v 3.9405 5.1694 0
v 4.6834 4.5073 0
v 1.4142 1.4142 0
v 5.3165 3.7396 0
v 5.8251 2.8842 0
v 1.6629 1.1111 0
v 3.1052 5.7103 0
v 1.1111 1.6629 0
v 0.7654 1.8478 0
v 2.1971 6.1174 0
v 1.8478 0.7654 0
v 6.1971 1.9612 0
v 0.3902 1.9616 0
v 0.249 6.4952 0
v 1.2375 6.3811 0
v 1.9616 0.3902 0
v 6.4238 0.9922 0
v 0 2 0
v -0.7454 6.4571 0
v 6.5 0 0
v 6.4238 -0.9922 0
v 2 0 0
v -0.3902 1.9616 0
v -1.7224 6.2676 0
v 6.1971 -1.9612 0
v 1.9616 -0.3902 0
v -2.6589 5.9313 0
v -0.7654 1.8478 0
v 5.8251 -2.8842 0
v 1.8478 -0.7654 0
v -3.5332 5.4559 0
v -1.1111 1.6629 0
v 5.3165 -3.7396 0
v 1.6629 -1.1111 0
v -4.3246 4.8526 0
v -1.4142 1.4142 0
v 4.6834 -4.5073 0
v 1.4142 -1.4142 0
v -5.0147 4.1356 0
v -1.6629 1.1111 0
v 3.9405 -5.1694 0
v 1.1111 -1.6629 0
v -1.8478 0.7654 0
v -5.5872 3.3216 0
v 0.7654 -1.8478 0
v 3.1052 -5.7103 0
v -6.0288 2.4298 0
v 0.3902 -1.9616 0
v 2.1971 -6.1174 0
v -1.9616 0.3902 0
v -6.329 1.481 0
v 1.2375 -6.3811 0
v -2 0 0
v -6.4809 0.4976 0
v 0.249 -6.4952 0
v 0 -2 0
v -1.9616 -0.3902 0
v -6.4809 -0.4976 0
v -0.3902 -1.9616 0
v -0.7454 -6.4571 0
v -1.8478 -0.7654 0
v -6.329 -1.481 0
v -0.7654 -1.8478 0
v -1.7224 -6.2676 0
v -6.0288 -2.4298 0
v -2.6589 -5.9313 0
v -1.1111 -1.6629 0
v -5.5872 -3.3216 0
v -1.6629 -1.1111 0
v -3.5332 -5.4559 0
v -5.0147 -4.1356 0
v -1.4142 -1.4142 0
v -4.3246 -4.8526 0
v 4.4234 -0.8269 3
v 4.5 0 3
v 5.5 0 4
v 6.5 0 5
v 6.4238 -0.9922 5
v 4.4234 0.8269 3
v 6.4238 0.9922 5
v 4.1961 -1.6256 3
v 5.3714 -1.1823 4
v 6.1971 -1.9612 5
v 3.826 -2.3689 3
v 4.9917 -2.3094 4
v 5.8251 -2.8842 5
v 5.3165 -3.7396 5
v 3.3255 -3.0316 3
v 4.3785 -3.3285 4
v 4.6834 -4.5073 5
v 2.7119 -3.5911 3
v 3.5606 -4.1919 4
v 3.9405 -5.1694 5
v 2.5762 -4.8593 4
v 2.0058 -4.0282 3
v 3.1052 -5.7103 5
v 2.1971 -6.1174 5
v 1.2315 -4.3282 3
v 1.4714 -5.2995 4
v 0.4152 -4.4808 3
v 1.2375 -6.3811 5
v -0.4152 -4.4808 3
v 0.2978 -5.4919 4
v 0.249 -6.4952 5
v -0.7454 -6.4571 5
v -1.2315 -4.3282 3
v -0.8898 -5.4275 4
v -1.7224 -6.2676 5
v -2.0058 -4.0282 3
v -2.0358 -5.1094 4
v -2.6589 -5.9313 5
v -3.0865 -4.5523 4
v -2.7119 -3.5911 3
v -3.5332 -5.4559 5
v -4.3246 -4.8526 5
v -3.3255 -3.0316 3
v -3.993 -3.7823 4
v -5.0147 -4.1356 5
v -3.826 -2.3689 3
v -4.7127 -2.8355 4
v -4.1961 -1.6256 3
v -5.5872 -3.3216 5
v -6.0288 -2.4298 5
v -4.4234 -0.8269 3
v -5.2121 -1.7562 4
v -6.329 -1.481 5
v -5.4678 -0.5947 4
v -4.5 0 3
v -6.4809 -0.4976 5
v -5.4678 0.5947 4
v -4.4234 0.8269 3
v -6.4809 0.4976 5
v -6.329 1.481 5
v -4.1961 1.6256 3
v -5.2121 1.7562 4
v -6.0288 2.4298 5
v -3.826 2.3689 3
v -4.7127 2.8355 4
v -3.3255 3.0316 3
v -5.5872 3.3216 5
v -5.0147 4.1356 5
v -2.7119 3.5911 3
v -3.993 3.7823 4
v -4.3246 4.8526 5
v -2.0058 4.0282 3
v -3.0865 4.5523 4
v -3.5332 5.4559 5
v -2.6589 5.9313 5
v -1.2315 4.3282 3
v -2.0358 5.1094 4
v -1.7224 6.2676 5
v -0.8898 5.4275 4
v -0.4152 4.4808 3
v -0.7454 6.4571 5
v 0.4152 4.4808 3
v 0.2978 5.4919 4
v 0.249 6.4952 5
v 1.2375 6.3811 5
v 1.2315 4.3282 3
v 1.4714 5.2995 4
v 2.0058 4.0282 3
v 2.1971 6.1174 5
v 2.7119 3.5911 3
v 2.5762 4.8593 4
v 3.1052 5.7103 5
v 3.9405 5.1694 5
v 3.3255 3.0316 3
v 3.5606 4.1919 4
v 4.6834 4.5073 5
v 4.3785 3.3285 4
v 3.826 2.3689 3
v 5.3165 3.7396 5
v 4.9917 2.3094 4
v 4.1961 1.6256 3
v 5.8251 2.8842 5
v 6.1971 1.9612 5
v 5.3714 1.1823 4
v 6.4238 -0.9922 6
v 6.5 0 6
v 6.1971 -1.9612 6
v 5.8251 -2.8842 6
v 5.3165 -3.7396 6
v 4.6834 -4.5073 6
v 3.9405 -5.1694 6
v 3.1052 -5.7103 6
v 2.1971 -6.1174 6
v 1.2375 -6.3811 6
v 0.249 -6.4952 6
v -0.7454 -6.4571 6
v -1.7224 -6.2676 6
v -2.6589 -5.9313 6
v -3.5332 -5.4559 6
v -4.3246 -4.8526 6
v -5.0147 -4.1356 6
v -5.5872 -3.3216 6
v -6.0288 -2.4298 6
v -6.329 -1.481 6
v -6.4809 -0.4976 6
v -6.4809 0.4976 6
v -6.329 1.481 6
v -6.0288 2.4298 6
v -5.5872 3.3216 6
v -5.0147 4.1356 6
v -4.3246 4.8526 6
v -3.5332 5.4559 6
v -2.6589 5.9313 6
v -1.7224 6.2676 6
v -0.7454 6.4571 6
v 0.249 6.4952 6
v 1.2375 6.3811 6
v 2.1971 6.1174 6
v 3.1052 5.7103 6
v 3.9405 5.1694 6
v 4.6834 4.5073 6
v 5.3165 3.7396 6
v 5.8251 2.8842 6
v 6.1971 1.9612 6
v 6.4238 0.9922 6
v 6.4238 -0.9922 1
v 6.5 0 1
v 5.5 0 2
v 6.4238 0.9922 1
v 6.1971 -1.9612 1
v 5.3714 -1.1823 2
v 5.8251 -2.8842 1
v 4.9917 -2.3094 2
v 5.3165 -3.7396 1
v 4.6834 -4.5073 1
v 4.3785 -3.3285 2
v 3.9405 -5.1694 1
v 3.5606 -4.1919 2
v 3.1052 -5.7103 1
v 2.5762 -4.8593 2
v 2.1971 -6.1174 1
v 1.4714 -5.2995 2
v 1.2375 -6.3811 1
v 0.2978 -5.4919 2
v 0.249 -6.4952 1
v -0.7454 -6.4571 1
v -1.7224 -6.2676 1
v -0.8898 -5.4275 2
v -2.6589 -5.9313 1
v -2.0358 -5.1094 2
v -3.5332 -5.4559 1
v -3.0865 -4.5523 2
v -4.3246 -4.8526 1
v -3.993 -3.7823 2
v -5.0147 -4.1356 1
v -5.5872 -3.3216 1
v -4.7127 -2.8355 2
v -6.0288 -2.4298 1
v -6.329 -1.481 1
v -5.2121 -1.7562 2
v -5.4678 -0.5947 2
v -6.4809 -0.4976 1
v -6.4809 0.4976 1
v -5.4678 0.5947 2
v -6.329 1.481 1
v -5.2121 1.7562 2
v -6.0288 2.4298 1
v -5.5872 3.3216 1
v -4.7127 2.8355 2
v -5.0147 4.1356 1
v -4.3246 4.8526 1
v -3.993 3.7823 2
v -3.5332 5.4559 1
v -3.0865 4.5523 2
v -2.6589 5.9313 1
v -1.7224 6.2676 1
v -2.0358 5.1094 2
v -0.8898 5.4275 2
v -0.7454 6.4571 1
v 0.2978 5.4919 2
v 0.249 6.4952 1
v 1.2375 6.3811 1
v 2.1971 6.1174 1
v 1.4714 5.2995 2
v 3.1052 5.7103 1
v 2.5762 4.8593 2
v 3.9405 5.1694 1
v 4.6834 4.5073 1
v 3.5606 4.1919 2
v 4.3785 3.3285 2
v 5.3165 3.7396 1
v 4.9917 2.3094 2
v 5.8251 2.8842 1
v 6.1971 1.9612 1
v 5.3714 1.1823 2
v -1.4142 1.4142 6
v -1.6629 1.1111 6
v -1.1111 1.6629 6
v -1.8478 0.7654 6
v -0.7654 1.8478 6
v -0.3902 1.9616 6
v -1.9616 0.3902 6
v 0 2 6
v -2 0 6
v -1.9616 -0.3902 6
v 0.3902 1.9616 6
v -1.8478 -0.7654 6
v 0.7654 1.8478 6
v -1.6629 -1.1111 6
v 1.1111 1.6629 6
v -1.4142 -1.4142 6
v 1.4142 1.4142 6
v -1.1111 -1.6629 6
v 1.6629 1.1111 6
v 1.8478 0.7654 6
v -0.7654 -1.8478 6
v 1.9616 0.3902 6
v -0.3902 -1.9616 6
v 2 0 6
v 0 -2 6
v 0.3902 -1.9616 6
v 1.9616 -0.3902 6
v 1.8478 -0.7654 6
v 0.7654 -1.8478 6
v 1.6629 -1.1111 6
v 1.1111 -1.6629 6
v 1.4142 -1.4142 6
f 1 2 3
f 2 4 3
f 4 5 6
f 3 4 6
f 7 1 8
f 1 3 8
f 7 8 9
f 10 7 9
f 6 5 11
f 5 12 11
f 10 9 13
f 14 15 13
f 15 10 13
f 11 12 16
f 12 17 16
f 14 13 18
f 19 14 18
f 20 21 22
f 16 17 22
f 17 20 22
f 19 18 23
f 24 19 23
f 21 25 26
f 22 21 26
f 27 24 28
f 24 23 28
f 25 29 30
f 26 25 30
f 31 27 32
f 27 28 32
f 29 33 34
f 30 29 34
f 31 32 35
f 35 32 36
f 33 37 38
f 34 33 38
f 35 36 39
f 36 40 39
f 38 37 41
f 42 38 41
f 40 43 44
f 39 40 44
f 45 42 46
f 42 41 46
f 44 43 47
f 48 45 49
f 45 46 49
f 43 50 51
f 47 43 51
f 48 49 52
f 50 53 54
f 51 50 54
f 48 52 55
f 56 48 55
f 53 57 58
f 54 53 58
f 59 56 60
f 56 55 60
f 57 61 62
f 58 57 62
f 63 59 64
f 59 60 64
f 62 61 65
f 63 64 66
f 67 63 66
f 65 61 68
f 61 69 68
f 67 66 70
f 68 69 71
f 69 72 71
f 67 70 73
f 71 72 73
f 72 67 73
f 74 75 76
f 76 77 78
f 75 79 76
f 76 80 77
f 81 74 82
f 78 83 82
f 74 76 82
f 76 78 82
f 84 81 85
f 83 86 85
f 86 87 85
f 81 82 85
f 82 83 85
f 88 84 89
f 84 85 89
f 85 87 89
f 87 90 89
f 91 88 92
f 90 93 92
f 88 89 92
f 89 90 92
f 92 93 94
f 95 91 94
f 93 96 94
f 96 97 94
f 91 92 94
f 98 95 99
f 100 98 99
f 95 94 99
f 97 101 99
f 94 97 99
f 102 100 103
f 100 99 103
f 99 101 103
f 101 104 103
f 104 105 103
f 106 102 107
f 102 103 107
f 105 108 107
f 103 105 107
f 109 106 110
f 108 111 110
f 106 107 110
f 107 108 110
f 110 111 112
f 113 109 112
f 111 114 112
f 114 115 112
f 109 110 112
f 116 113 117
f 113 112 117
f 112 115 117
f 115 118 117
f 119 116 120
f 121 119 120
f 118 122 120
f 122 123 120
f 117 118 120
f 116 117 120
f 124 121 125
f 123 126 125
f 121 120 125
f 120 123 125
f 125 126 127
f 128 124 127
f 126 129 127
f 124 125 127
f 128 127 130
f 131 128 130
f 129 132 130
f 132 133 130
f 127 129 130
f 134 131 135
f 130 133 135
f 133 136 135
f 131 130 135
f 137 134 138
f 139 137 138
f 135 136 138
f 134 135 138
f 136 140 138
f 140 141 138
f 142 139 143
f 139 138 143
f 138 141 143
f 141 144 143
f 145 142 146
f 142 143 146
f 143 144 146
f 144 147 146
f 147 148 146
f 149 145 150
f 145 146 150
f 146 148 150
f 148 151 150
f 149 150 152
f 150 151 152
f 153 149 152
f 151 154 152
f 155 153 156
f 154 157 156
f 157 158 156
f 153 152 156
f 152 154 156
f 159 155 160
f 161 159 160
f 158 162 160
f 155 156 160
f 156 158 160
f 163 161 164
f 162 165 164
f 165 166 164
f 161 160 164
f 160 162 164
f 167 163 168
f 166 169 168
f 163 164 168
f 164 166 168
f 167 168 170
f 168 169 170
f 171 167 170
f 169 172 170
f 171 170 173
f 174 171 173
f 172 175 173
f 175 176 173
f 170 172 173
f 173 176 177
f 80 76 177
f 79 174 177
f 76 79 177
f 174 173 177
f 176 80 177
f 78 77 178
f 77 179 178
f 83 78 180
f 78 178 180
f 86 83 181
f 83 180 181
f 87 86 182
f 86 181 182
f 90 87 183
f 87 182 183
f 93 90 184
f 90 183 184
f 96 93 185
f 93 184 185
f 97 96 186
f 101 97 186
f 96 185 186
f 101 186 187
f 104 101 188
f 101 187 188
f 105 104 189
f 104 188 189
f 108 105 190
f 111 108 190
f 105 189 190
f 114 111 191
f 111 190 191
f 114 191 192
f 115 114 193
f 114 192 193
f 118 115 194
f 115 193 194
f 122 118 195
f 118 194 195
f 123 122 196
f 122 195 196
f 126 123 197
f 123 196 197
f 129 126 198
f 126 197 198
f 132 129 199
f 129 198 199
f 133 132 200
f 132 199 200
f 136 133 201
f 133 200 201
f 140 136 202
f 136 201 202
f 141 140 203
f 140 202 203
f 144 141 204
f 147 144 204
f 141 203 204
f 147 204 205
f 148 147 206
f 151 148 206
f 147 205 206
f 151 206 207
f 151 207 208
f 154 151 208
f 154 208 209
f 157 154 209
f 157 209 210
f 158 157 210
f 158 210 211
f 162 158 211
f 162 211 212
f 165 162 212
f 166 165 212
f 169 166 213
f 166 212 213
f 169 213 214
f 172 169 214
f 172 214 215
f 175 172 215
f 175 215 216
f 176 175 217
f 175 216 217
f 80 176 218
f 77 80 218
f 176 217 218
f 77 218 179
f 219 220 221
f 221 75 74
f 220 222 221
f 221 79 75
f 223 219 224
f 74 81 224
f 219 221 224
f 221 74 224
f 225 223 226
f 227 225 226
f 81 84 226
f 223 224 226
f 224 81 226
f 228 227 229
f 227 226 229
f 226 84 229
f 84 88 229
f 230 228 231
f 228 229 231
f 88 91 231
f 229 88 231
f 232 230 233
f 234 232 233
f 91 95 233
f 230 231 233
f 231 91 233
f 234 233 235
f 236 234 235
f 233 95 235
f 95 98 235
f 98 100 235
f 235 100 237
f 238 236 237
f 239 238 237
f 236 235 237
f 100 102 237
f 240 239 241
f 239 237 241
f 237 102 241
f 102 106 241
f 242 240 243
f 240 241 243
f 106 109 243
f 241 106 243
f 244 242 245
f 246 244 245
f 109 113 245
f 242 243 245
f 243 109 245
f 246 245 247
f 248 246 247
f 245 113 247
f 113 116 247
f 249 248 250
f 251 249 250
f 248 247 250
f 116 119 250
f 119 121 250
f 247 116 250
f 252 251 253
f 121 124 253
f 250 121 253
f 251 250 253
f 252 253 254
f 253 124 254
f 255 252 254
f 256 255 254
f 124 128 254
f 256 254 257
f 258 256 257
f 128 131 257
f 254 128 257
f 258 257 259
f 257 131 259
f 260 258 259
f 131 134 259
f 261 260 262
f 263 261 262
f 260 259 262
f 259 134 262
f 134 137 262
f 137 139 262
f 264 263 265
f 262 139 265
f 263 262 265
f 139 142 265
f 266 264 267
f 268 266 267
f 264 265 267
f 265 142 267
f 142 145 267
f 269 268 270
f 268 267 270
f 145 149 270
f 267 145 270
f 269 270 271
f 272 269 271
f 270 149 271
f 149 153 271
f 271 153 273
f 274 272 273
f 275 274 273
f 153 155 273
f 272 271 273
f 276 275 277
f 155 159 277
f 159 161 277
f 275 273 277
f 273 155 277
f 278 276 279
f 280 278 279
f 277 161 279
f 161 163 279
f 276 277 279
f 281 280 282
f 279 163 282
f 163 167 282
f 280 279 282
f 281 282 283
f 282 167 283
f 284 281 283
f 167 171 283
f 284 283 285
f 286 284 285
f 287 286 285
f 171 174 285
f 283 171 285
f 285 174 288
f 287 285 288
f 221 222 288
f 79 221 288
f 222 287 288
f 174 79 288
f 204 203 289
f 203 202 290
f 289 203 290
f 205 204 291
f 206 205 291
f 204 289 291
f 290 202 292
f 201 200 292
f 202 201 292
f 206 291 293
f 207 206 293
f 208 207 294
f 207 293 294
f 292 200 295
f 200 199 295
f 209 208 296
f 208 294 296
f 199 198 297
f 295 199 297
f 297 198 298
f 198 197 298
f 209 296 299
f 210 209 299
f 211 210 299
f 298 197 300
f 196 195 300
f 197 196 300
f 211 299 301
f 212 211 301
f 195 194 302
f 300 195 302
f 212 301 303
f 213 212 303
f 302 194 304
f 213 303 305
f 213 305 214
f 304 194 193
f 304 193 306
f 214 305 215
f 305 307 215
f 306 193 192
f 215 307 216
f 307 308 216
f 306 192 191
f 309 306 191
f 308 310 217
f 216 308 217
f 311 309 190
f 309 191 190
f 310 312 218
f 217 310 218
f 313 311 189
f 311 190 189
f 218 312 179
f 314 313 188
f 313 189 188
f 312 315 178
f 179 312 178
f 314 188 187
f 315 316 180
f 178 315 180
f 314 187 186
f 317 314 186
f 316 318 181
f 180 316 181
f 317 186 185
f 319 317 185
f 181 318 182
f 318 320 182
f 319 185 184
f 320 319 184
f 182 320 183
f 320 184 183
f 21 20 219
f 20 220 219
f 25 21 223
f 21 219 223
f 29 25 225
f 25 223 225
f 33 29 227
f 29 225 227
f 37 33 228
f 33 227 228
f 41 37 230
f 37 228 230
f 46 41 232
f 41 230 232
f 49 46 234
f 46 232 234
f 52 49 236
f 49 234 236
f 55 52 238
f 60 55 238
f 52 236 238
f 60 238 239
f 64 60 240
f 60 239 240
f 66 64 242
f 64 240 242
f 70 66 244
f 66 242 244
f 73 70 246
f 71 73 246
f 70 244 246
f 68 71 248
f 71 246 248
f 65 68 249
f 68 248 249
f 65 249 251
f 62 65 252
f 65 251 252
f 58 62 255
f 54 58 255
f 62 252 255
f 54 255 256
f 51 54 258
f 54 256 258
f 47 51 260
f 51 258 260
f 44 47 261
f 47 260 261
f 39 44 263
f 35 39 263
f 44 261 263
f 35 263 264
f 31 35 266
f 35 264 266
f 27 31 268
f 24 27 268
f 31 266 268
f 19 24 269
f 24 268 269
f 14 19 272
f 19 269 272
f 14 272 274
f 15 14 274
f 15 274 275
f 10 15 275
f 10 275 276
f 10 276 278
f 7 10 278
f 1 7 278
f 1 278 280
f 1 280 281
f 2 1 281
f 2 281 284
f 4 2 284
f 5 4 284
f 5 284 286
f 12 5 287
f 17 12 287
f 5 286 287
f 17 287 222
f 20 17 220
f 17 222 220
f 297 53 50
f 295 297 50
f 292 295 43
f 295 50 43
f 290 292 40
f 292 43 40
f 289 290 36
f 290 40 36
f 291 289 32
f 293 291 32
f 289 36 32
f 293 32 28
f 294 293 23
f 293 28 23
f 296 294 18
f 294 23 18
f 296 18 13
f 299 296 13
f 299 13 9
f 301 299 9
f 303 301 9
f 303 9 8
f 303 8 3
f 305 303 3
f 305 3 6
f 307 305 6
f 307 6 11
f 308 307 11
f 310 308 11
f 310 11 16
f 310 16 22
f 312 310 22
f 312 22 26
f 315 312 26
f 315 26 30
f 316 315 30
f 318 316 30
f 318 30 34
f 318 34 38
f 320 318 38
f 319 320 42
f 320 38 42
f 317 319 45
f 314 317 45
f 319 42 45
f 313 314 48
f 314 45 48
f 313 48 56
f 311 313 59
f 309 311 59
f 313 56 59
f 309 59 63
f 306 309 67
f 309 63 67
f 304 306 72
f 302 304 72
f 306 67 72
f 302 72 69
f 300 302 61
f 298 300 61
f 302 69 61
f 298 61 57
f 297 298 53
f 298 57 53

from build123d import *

# Parameters (mm, degrees)
F_4_0_4_DIAMETER_HOLE1_D = 4


with BuildPart() as part:
    # Sketch1 → Revolve1 (revolve)
    with BuildSketch(Plane(origin=(0, 0, 0), x_dir=(0, 0, -1), z_dir=(1, 0, 0)), mode=Mode.PRIVATE) as revolve1_sk:
        Polygon((0, 0), (0, 6.5), (-1, 6.5), (-3, 4.5), (-5, 6.5), (-6, 6.5), (-6, 0), align=None)
    revolve(revolve1_sk.sketch.rotate(Axis((0, 0, 55), (0, 0, -1)), 90), axis=Axis((0, 0, 55), (0, 0, -1)))

    # Ø4.0 (4) Diameter Hole1 (through all)
    with Locations(Plane.XY.offset(6)):
        with Locations((0, 0)):
            Hole(F_4_0_4_DIAMETER_HOLE1_D / 2)


solid = part.part
